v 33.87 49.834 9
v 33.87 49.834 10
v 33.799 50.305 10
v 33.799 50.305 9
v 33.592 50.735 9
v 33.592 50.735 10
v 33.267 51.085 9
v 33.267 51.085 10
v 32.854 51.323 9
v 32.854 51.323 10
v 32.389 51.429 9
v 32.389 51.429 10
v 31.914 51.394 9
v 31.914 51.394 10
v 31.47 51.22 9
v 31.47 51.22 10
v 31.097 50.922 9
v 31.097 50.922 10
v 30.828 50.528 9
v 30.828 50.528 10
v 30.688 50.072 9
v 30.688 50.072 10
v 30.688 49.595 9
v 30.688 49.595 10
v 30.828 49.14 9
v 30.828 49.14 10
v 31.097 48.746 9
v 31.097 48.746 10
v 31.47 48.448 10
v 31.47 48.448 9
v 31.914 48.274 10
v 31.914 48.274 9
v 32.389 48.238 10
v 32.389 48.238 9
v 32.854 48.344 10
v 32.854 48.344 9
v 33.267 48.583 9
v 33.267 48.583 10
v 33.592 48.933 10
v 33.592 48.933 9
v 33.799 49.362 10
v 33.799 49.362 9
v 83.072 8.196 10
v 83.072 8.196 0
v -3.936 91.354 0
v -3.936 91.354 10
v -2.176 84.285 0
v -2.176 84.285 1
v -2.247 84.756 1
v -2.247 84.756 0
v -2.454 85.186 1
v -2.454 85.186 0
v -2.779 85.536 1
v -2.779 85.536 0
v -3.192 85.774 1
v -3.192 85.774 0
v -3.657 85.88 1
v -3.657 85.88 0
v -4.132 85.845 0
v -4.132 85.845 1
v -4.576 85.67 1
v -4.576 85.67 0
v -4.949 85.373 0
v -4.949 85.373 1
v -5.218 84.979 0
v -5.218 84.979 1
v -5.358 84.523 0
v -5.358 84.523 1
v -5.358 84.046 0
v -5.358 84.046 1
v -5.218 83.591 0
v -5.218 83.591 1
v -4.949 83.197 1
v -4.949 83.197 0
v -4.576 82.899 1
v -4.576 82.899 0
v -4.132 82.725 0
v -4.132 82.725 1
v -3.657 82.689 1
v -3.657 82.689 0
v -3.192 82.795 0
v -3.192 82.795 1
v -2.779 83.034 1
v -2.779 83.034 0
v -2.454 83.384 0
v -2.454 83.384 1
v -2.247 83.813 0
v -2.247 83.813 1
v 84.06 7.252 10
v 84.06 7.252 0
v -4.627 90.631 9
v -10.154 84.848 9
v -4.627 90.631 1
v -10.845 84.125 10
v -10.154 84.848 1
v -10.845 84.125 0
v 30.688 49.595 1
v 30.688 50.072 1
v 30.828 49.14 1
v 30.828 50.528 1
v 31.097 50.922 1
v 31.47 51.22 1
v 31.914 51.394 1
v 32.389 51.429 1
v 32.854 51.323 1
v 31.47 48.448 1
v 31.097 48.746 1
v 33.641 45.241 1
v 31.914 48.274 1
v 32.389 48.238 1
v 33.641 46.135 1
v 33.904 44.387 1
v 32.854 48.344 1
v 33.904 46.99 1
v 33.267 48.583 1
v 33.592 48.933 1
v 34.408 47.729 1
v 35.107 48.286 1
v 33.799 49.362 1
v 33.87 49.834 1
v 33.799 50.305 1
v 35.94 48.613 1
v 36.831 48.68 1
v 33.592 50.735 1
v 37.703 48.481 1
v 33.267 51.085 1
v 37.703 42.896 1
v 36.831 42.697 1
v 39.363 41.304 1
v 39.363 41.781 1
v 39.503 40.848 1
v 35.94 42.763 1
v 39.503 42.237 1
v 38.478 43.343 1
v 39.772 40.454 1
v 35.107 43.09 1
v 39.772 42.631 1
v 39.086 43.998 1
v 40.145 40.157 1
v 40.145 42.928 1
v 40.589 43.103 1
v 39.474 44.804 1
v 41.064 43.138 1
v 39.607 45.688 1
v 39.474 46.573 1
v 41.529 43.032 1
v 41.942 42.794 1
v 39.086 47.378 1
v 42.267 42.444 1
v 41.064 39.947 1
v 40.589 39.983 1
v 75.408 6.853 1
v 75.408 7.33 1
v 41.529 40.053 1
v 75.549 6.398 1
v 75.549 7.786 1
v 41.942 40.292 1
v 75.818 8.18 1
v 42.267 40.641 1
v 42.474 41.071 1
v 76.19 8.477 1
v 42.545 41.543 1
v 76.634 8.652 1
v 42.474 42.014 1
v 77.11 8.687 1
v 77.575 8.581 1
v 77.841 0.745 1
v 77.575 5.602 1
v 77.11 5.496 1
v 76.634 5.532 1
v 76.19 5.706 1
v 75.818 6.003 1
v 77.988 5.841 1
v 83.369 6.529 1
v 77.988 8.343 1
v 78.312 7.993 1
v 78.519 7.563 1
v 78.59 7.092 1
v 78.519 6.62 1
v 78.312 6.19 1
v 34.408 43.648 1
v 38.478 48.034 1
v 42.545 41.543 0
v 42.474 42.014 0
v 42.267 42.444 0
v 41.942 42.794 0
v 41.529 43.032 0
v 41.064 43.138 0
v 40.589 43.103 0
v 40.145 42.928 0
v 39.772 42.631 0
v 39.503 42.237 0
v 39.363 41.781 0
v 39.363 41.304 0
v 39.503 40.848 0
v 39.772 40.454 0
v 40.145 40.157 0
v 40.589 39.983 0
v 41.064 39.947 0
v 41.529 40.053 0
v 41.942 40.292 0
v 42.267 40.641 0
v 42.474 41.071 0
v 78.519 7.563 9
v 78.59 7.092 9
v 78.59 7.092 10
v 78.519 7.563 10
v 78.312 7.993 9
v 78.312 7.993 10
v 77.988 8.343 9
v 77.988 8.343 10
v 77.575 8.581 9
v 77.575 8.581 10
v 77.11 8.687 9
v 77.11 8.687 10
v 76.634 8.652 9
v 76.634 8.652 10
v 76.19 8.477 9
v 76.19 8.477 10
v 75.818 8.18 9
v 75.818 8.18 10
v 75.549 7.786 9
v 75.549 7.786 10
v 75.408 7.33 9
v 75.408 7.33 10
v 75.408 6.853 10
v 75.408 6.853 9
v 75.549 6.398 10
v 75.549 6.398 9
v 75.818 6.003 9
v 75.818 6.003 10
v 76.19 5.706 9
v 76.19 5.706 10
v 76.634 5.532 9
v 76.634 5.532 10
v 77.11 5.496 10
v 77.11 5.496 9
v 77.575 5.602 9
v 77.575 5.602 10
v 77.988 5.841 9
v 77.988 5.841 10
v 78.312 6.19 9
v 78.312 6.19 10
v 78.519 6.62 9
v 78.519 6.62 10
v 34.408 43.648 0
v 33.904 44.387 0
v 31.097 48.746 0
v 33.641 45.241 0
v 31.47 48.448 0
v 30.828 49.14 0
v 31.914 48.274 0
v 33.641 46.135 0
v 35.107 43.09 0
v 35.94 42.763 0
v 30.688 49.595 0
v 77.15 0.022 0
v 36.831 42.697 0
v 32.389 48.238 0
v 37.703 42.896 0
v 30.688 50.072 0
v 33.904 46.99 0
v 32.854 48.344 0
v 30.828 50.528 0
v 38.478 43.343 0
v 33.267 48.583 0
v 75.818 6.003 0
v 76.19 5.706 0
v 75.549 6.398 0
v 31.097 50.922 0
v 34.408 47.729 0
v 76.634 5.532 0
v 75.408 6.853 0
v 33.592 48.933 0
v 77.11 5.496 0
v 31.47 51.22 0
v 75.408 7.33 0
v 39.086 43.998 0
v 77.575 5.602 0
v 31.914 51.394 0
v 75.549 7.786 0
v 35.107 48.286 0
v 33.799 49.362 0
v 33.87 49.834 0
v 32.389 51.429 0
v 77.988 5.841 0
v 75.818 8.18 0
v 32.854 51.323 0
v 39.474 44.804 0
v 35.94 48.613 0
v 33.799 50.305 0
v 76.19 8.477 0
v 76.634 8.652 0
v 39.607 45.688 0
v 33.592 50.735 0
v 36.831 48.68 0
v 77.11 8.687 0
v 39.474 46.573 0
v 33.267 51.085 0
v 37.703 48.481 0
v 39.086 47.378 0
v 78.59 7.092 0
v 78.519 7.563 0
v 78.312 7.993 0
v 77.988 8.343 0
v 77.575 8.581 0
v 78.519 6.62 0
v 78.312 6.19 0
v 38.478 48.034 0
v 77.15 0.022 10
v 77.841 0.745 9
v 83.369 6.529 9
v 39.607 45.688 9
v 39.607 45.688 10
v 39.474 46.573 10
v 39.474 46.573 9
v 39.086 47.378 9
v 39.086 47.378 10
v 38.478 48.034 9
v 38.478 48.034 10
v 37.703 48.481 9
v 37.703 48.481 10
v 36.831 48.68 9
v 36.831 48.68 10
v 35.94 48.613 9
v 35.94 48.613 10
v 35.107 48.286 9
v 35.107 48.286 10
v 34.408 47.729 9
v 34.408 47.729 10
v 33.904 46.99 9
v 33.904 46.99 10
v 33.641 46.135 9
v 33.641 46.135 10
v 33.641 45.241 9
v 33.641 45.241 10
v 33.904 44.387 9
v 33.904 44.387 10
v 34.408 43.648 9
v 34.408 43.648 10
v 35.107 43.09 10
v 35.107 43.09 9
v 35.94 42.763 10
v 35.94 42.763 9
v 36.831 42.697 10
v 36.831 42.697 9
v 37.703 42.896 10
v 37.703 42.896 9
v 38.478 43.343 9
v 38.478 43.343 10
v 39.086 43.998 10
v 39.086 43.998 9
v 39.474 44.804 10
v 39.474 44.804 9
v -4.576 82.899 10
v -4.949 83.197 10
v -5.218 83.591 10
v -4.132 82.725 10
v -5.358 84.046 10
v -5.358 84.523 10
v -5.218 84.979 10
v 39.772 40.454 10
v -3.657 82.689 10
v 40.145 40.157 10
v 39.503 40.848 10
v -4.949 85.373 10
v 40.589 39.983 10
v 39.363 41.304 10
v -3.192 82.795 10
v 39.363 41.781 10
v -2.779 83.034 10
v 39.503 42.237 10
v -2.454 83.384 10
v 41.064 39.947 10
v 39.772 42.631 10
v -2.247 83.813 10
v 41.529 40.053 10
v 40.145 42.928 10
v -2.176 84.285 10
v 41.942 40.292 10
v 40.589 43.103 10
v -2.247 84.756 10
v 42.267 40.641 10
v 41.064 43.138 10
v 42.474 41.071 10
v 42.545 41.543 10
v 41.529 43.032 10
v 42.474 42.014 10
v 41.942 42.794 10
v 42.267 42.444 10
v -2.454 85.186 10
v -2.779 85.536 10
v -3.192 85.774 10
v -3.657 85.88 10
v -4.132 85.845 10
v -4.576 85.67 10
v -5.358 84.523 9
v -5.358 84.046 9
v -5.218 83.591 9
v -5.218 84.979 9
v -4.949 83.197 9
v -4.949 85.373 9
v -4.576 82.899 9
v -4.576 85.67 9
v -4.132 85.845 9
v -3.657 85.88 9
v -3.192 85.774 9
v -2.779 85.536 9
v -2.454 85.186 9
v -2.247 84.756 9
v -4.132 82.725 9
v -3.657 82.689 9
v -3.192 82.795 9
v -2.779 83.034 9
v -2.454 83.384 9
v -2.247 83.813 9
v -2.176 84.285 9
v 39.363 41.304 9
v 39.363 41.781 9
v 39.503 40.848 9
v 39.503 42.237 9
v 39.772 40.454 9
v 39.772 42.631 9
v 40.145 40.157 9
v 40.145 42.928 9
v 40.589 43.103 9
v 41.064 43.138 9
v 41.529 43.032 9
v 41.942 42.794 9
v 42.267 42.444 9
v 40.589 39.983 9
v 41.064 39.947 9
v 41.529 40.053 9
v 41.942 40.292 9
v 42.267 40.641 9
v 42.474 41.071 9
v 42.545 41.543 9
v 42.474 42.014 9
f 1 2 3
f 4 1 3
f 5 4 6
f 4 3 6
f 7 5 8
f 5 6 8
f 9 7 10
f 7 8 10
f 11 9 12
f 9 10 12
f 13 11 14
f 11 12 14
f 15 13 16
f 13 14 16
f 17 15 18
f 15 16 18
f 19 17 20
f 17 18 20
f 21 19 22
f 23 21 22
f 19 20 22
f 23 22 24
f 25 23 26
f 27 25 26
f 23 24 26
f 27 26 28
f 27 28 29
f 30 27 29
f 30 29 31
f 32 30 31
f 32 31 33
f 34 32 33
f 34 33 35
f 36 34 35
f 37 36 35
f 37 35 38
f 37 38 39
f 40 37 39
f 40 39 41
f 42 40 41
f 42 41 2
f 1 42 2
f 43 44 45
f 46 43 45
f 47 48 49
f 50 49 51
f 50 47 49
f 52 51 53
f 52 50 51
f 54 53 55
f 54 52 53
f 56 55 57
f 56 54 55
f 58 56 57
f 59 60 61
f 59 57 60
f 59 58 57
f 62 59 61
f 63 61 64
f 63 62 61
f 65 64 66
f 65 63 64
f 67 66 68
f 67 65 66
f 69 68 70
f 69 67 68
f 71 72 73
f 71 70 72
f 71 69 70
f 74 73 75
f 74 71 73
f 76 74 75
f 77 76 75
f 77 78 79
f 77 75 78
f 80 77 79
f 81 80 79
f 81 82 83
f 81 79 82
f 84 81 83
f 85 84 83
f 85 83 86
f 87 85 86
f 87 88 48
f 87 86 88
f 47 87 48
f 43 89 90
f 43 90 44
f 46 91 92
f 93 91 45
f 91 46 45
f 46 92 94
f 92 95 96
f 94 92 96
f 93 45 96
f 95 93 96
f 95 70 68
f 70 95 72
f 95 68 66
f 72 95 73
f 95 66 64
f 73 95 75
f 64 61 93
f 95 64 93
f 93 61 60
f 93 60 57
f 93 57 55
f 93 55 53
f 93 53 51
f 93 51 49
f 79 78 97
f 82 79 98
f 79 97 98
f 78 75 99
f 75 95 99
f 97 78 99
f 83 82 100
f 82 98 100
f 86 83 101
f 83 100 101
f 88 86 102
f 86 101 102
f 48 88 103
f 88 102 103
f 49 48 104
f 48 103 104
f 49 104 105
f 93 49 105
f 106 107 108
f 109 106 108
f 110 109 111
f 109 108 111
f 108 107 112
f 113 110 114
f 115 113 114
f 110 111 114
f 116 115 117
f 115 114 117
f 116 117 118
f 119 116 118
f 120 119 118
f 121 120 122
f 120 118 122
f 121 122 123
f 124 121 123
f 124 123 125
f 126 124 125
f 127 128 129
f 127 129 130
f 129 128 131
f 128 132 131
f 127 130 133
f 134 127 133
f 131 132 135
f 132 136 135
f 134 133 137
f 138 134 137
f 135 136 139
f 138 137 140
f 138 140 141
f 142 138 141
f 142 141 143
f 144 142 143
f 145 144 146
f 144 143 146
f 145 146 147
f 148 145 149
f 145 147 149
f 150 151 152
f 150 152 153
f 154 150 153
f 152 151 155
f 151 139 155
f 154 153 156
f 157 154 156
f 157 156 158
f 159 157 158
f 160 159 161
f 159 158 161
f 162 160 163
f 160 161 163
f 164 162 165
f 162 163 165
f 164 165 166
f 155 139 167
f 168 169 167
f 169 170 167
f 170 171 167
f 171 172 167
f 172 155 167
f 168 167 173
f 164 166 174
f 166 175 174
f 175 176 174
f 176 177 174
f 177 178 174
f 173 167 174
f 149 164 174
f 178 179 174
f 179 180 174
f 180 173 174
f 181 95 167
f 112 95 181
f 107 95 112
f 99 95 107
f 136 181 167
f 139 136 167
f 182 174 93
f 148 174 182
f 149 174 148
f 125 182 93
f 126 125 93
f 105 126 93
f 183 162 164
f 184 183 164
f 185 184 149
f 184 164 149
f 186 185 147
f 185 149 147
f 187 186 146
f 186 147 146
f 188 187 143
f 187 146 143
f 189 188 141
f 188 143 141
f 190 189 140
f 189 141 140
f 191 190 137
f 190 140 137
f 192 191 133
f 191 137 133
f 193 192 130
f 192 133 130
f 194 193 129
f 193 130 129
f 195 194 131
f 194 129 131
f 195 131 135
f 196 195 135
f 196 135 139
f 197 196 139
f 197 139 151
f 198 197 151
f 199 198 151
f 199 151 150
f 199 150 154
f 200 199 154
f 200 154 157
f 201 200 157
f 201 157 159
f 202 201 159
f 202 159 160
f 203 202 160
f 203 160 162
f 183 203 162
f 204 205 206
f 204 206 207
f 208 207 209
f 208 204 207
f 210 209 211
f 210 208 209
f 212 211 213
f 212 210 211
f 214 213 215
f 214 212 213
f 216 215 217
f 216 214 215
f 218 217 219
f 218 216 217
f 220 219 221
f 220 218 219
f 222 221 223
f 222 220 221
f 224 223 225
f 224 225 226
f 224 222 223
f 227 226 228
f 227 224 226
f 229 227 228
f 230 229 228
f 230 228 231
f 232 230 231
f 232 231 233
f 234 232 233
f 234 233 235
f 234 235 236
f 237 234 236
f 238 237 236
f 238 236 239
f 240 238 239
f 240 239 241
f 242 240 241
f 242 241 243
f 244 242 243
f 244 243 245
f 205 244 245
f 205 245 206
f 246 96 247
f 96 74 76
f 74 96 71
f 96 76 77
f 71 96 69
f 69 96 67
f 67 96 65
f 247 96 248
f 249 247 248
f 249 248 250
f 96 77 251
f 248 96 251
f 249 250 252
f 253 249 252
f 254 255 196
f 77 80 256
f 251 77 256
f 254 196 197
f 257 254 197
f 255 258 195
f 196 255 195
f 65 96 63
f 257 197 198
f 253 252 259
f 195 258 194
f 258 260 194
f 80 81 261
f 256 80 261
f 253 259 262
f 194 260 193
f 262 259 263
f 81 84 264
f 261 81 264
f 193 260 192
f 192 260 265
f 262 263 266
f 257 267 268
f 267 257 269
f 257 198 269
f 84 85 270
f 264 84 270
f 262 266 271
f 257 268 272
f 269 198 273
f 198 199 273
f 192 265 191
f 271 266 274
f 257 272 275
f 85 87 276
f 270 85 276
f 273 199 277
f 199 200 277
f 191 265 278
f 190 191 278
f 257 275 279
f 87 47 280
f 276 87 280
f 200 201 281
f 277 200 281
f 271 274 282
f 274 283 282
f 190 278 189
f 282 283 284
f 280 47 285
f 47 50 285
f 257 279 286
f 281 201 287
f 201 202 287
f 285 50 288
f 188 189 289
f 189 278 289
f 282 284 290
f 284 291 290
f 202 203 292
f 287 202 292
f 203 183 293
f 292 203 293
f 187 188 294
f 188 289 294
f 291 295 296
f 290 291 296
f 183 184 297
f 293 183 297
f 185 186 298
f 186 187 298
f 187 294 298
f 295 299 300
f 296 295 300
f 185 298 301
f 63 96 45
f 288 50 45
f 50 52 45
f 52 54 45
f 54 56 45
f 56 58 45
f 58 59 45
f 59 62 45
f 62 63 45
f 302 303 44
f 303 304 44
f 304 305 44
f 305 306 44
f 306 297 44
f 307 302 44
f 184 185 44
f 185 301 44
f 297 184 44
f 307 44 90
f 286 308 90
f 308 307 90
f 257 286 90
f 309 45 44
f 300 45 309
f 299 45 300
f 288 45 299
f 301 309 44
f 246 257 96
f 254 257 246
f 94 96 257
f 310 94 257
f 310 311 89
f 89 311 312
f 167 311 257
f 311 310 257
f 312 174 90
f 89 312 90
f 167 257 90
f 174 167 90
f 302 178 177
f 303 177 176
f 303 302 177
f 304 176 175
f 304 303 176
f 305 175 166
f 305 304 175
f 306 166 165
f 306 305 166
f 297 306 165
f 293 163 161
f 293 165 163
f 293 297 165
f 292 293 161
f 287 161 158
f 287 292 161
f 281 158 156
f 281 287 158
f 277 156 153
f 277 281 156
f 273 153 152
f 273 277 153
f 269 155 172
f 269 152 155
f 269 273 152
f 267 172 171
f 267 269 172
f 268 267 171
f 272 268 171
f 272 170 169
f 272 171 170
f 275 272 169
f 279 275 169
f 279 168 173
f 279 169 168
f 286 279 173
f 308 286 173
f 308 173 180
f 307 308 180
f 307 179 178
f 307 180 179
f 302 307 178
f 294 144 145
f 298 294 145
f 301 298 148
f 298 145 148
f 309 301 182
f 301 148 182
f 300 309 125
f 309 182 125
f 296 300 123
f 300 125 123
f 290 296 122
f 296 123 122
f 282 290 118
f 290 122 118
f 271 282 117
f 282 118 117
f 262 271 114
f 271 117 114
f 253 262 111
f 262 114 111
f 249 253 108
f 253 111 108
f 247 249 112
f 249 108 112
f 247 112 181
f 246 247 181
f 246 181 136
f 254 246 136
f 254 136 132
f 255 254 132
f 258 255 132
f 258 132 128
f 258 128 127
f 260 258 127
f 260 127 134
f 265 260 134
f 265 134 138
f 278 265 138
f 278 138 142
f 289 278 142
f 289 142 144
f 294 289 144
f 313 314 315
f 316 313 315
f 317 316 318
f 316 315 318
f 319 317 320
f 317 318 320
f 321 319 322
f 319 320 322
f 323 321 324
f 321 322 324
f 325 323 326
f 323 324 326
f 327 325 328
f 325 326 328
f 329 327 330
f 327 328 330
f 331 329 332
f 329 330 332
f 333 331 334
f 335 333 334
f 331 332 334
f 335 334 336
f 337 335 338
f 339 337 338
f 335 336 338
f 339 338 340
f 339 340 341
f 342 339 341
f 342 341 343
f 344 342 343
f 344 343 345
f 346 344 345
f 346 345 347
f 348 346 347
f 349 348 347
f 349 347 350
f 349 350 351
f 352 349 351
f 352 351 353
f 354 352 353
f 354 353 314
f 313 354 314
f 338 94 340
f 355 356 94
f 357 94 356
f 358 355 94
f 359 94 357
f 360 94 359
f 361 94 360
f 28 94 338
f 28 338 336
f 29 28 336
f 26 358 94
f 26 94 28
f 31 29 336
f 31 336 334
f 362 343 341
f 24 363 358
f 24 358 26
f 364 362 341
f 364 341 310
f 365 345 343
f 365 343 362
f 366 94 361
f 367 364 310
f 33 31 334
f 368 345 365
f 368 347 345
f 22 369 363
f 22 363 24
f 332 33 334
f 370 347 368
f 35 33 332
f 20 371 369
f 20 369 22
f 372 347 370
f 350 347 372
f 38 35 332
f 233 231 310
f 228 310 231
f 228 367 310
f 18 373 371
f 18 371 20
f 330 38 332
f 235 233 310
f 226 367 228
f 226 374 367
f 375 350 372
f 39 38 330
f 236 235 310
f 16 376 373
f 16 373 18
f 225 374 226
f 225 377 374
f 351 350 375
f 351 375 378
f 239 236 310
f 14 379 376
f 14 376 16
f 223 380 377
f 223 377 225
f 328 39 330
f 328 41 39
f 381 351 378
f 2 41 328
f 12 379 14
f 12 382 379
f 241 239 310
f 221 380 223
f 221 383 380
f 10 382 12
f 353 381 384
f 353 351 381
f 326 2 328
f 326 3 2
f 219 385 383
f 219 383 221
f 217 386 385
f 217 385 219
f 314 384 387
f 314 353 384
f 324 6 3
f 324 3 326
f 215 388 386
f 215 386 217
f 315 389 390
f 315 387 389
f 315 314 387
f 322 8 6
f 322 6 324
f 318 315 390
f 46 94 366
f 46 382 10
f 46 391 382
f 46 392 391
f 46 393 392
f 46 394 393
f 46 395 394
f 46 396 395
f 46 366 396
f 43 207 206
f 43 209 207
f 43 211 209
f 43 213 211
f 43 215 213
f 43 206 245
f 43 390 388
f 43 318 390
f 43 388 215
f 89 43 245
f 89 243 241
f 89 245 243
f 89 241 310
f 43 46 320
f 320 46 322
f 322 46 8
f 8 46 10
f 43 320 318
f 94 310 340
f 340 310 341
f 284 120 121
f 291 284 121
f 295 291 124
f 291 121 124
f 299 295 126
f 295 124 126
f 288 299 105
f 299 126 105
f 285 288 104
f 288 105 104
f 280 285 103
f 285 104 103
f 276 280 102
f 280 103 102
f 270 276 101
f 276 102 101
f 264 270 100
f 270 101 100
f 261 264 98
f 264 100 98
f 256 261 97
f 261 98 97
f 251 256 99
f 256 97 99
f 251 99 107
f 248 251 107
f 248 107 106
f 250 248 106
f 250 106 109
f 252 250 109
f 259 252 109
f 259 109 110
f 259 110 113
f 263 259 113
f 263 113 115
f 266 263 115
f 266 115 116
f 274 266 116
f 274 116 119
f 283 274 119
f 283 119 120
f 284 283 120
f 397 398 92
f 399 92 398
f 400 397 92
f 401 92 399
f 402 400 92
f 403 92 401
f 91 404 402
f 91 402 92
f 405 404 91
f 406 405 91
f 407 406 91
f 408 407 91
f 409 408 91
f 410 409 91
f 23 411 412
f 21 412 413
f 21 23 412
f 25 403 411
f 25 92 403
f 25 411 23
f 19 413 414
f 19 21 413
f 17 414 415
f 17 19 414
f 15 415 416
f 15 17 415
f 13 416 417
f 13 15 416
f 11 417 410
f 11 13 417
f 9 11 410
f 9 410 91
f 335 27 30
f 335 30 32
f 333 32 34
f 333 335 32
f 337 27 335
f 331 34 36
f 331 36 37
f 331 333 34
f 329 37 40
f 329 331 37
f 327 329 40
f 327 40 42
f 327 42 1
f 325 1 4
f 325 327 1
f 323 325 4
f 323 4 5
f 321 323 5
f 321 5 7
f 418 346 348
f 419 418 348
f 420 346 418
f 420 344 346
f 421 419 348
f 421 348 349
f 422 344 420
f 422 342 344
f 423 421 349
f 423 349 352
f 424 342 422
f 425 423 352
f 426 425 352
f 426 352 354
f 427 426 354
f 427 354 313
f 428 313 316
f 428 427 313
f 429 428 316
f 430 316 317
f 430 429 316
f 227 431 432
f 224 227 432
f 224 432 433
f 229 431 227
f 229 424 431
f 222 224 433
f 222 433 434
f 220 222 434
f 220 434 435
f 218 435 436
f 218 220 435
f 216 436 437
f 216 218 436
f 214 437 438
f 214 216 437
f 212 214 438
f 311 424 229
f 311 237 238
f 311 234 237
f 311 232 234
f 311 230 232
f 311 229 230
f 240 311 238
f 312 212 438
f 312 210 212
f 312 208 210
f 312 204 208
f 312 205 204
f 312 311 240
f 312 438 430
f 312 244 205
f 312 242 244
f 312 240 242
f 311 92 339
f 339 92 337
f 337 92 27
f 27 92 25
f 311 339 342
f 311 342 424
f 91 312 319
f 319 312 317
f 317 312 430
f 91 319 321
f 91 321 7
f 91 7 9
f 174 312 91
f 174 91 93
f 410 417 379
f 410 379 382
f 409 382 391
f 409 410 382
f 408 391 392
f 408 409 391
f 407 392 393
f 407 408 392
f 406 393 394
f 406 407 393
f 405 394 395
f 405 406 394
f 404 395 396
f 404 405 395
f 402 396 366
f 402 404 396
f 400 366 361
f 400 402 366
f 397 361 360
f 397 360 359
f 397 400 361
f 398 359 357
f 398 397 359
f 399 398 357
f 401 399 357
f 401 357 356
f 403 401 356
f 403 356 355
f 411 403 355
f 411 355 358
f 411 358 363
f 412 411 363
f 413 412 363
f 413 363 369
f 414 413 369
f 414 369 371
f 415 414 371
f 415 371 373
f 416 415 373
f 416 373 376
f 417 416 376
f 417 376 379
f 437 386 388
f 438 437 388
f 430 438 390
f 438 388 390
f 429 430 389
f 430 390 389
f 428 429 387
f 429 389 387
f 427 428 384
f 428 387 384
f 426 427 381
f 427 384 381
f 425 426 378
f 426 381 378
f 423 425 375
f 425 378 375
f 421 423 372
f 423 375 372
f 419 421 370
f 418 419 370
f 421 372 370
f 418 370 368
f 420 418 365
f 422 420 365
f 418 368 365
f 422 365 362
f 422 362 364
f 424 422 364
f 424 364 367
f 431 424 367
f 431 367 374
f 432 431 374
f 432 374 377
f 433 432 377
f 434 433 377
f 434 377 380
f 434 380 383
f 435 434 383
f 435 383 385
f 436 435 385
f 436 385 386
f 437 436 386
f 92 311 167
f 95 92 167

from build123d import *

# Parameters (mm, degrees)
SKETCH_2_R          = 1.6
EXTRUDE_1_DEPTH     = 10
SKETCH_3_W          = 8
SKETCH_3_H          = 8
CUT_EXTRUDE_1_DEPTH = 140.947387002
SKETCH_4_R          = 1.6
SKETCH_4_R_2        = 3
CUT_EXTRUDE_2_DEPTH = 10


with BuildPart() as part:
    # ｽｹｯﾁ2 → ﾎﾞｽ - 押し出し1 (new body)
    with BuildSketch(Plane.XY):
        Polygon((83.071643169, 8.195972832), (-3.936021884, 91.354077293), (-10.845357286, 84.124894469), (77.150331852, 0.022479987), (84.059667254, 7.25166281), align=None)
        with Locations((-3.776098173, 84.28481818)):
            Circle(SKETCH_2_R, mode=Mode.SUBTRACT)
        with Locations((76.990408141, 7.0917391)):
            Circle(SKETCH_2_R, mode=Mode.SUBTRACT)
    extrude(amount=EXTRUDE_1_DEPTH)

    # ｽｹｯﾁ3 → ｶｯﾄ - 押し出し1 (cut, through all)
    with BuildSketch(Plane(origin=(40.308371471, -38.524970914, 0), x_dir=(0, 0, -1), z_dir=(0.7229182823698357, -0.690933540230496, 0))):
        with Locations((-5, 58.32200311)):
            Rectangle(SKETCH_3_W, SKETCH_3_H)
    extrude(amount=-CUT_EXTRUDE_1_DEPTH, mode=Mode.SUBTRACT)

    # ｽｹｯﾁ4 → ｶｯﾄ - 押し出し2 (cut)
    with BuildSketch(Plane.XY.offset(10)):
        with Locations((40.944664678, 41.542677398)):
            Circle(SKETCH_4_R)
        with Locations((32.26964529, 49.833879881)):
            Circle(SKETCH_4_R)
        with Locations((36.607154984, 45.68827864)):
            Circle(SKETCH_4_R_2)
    extrude(amount=-CUT_EXTRUDE_2_DEPTH, mode=Mode.SUBTRACT)


solid = part.part
